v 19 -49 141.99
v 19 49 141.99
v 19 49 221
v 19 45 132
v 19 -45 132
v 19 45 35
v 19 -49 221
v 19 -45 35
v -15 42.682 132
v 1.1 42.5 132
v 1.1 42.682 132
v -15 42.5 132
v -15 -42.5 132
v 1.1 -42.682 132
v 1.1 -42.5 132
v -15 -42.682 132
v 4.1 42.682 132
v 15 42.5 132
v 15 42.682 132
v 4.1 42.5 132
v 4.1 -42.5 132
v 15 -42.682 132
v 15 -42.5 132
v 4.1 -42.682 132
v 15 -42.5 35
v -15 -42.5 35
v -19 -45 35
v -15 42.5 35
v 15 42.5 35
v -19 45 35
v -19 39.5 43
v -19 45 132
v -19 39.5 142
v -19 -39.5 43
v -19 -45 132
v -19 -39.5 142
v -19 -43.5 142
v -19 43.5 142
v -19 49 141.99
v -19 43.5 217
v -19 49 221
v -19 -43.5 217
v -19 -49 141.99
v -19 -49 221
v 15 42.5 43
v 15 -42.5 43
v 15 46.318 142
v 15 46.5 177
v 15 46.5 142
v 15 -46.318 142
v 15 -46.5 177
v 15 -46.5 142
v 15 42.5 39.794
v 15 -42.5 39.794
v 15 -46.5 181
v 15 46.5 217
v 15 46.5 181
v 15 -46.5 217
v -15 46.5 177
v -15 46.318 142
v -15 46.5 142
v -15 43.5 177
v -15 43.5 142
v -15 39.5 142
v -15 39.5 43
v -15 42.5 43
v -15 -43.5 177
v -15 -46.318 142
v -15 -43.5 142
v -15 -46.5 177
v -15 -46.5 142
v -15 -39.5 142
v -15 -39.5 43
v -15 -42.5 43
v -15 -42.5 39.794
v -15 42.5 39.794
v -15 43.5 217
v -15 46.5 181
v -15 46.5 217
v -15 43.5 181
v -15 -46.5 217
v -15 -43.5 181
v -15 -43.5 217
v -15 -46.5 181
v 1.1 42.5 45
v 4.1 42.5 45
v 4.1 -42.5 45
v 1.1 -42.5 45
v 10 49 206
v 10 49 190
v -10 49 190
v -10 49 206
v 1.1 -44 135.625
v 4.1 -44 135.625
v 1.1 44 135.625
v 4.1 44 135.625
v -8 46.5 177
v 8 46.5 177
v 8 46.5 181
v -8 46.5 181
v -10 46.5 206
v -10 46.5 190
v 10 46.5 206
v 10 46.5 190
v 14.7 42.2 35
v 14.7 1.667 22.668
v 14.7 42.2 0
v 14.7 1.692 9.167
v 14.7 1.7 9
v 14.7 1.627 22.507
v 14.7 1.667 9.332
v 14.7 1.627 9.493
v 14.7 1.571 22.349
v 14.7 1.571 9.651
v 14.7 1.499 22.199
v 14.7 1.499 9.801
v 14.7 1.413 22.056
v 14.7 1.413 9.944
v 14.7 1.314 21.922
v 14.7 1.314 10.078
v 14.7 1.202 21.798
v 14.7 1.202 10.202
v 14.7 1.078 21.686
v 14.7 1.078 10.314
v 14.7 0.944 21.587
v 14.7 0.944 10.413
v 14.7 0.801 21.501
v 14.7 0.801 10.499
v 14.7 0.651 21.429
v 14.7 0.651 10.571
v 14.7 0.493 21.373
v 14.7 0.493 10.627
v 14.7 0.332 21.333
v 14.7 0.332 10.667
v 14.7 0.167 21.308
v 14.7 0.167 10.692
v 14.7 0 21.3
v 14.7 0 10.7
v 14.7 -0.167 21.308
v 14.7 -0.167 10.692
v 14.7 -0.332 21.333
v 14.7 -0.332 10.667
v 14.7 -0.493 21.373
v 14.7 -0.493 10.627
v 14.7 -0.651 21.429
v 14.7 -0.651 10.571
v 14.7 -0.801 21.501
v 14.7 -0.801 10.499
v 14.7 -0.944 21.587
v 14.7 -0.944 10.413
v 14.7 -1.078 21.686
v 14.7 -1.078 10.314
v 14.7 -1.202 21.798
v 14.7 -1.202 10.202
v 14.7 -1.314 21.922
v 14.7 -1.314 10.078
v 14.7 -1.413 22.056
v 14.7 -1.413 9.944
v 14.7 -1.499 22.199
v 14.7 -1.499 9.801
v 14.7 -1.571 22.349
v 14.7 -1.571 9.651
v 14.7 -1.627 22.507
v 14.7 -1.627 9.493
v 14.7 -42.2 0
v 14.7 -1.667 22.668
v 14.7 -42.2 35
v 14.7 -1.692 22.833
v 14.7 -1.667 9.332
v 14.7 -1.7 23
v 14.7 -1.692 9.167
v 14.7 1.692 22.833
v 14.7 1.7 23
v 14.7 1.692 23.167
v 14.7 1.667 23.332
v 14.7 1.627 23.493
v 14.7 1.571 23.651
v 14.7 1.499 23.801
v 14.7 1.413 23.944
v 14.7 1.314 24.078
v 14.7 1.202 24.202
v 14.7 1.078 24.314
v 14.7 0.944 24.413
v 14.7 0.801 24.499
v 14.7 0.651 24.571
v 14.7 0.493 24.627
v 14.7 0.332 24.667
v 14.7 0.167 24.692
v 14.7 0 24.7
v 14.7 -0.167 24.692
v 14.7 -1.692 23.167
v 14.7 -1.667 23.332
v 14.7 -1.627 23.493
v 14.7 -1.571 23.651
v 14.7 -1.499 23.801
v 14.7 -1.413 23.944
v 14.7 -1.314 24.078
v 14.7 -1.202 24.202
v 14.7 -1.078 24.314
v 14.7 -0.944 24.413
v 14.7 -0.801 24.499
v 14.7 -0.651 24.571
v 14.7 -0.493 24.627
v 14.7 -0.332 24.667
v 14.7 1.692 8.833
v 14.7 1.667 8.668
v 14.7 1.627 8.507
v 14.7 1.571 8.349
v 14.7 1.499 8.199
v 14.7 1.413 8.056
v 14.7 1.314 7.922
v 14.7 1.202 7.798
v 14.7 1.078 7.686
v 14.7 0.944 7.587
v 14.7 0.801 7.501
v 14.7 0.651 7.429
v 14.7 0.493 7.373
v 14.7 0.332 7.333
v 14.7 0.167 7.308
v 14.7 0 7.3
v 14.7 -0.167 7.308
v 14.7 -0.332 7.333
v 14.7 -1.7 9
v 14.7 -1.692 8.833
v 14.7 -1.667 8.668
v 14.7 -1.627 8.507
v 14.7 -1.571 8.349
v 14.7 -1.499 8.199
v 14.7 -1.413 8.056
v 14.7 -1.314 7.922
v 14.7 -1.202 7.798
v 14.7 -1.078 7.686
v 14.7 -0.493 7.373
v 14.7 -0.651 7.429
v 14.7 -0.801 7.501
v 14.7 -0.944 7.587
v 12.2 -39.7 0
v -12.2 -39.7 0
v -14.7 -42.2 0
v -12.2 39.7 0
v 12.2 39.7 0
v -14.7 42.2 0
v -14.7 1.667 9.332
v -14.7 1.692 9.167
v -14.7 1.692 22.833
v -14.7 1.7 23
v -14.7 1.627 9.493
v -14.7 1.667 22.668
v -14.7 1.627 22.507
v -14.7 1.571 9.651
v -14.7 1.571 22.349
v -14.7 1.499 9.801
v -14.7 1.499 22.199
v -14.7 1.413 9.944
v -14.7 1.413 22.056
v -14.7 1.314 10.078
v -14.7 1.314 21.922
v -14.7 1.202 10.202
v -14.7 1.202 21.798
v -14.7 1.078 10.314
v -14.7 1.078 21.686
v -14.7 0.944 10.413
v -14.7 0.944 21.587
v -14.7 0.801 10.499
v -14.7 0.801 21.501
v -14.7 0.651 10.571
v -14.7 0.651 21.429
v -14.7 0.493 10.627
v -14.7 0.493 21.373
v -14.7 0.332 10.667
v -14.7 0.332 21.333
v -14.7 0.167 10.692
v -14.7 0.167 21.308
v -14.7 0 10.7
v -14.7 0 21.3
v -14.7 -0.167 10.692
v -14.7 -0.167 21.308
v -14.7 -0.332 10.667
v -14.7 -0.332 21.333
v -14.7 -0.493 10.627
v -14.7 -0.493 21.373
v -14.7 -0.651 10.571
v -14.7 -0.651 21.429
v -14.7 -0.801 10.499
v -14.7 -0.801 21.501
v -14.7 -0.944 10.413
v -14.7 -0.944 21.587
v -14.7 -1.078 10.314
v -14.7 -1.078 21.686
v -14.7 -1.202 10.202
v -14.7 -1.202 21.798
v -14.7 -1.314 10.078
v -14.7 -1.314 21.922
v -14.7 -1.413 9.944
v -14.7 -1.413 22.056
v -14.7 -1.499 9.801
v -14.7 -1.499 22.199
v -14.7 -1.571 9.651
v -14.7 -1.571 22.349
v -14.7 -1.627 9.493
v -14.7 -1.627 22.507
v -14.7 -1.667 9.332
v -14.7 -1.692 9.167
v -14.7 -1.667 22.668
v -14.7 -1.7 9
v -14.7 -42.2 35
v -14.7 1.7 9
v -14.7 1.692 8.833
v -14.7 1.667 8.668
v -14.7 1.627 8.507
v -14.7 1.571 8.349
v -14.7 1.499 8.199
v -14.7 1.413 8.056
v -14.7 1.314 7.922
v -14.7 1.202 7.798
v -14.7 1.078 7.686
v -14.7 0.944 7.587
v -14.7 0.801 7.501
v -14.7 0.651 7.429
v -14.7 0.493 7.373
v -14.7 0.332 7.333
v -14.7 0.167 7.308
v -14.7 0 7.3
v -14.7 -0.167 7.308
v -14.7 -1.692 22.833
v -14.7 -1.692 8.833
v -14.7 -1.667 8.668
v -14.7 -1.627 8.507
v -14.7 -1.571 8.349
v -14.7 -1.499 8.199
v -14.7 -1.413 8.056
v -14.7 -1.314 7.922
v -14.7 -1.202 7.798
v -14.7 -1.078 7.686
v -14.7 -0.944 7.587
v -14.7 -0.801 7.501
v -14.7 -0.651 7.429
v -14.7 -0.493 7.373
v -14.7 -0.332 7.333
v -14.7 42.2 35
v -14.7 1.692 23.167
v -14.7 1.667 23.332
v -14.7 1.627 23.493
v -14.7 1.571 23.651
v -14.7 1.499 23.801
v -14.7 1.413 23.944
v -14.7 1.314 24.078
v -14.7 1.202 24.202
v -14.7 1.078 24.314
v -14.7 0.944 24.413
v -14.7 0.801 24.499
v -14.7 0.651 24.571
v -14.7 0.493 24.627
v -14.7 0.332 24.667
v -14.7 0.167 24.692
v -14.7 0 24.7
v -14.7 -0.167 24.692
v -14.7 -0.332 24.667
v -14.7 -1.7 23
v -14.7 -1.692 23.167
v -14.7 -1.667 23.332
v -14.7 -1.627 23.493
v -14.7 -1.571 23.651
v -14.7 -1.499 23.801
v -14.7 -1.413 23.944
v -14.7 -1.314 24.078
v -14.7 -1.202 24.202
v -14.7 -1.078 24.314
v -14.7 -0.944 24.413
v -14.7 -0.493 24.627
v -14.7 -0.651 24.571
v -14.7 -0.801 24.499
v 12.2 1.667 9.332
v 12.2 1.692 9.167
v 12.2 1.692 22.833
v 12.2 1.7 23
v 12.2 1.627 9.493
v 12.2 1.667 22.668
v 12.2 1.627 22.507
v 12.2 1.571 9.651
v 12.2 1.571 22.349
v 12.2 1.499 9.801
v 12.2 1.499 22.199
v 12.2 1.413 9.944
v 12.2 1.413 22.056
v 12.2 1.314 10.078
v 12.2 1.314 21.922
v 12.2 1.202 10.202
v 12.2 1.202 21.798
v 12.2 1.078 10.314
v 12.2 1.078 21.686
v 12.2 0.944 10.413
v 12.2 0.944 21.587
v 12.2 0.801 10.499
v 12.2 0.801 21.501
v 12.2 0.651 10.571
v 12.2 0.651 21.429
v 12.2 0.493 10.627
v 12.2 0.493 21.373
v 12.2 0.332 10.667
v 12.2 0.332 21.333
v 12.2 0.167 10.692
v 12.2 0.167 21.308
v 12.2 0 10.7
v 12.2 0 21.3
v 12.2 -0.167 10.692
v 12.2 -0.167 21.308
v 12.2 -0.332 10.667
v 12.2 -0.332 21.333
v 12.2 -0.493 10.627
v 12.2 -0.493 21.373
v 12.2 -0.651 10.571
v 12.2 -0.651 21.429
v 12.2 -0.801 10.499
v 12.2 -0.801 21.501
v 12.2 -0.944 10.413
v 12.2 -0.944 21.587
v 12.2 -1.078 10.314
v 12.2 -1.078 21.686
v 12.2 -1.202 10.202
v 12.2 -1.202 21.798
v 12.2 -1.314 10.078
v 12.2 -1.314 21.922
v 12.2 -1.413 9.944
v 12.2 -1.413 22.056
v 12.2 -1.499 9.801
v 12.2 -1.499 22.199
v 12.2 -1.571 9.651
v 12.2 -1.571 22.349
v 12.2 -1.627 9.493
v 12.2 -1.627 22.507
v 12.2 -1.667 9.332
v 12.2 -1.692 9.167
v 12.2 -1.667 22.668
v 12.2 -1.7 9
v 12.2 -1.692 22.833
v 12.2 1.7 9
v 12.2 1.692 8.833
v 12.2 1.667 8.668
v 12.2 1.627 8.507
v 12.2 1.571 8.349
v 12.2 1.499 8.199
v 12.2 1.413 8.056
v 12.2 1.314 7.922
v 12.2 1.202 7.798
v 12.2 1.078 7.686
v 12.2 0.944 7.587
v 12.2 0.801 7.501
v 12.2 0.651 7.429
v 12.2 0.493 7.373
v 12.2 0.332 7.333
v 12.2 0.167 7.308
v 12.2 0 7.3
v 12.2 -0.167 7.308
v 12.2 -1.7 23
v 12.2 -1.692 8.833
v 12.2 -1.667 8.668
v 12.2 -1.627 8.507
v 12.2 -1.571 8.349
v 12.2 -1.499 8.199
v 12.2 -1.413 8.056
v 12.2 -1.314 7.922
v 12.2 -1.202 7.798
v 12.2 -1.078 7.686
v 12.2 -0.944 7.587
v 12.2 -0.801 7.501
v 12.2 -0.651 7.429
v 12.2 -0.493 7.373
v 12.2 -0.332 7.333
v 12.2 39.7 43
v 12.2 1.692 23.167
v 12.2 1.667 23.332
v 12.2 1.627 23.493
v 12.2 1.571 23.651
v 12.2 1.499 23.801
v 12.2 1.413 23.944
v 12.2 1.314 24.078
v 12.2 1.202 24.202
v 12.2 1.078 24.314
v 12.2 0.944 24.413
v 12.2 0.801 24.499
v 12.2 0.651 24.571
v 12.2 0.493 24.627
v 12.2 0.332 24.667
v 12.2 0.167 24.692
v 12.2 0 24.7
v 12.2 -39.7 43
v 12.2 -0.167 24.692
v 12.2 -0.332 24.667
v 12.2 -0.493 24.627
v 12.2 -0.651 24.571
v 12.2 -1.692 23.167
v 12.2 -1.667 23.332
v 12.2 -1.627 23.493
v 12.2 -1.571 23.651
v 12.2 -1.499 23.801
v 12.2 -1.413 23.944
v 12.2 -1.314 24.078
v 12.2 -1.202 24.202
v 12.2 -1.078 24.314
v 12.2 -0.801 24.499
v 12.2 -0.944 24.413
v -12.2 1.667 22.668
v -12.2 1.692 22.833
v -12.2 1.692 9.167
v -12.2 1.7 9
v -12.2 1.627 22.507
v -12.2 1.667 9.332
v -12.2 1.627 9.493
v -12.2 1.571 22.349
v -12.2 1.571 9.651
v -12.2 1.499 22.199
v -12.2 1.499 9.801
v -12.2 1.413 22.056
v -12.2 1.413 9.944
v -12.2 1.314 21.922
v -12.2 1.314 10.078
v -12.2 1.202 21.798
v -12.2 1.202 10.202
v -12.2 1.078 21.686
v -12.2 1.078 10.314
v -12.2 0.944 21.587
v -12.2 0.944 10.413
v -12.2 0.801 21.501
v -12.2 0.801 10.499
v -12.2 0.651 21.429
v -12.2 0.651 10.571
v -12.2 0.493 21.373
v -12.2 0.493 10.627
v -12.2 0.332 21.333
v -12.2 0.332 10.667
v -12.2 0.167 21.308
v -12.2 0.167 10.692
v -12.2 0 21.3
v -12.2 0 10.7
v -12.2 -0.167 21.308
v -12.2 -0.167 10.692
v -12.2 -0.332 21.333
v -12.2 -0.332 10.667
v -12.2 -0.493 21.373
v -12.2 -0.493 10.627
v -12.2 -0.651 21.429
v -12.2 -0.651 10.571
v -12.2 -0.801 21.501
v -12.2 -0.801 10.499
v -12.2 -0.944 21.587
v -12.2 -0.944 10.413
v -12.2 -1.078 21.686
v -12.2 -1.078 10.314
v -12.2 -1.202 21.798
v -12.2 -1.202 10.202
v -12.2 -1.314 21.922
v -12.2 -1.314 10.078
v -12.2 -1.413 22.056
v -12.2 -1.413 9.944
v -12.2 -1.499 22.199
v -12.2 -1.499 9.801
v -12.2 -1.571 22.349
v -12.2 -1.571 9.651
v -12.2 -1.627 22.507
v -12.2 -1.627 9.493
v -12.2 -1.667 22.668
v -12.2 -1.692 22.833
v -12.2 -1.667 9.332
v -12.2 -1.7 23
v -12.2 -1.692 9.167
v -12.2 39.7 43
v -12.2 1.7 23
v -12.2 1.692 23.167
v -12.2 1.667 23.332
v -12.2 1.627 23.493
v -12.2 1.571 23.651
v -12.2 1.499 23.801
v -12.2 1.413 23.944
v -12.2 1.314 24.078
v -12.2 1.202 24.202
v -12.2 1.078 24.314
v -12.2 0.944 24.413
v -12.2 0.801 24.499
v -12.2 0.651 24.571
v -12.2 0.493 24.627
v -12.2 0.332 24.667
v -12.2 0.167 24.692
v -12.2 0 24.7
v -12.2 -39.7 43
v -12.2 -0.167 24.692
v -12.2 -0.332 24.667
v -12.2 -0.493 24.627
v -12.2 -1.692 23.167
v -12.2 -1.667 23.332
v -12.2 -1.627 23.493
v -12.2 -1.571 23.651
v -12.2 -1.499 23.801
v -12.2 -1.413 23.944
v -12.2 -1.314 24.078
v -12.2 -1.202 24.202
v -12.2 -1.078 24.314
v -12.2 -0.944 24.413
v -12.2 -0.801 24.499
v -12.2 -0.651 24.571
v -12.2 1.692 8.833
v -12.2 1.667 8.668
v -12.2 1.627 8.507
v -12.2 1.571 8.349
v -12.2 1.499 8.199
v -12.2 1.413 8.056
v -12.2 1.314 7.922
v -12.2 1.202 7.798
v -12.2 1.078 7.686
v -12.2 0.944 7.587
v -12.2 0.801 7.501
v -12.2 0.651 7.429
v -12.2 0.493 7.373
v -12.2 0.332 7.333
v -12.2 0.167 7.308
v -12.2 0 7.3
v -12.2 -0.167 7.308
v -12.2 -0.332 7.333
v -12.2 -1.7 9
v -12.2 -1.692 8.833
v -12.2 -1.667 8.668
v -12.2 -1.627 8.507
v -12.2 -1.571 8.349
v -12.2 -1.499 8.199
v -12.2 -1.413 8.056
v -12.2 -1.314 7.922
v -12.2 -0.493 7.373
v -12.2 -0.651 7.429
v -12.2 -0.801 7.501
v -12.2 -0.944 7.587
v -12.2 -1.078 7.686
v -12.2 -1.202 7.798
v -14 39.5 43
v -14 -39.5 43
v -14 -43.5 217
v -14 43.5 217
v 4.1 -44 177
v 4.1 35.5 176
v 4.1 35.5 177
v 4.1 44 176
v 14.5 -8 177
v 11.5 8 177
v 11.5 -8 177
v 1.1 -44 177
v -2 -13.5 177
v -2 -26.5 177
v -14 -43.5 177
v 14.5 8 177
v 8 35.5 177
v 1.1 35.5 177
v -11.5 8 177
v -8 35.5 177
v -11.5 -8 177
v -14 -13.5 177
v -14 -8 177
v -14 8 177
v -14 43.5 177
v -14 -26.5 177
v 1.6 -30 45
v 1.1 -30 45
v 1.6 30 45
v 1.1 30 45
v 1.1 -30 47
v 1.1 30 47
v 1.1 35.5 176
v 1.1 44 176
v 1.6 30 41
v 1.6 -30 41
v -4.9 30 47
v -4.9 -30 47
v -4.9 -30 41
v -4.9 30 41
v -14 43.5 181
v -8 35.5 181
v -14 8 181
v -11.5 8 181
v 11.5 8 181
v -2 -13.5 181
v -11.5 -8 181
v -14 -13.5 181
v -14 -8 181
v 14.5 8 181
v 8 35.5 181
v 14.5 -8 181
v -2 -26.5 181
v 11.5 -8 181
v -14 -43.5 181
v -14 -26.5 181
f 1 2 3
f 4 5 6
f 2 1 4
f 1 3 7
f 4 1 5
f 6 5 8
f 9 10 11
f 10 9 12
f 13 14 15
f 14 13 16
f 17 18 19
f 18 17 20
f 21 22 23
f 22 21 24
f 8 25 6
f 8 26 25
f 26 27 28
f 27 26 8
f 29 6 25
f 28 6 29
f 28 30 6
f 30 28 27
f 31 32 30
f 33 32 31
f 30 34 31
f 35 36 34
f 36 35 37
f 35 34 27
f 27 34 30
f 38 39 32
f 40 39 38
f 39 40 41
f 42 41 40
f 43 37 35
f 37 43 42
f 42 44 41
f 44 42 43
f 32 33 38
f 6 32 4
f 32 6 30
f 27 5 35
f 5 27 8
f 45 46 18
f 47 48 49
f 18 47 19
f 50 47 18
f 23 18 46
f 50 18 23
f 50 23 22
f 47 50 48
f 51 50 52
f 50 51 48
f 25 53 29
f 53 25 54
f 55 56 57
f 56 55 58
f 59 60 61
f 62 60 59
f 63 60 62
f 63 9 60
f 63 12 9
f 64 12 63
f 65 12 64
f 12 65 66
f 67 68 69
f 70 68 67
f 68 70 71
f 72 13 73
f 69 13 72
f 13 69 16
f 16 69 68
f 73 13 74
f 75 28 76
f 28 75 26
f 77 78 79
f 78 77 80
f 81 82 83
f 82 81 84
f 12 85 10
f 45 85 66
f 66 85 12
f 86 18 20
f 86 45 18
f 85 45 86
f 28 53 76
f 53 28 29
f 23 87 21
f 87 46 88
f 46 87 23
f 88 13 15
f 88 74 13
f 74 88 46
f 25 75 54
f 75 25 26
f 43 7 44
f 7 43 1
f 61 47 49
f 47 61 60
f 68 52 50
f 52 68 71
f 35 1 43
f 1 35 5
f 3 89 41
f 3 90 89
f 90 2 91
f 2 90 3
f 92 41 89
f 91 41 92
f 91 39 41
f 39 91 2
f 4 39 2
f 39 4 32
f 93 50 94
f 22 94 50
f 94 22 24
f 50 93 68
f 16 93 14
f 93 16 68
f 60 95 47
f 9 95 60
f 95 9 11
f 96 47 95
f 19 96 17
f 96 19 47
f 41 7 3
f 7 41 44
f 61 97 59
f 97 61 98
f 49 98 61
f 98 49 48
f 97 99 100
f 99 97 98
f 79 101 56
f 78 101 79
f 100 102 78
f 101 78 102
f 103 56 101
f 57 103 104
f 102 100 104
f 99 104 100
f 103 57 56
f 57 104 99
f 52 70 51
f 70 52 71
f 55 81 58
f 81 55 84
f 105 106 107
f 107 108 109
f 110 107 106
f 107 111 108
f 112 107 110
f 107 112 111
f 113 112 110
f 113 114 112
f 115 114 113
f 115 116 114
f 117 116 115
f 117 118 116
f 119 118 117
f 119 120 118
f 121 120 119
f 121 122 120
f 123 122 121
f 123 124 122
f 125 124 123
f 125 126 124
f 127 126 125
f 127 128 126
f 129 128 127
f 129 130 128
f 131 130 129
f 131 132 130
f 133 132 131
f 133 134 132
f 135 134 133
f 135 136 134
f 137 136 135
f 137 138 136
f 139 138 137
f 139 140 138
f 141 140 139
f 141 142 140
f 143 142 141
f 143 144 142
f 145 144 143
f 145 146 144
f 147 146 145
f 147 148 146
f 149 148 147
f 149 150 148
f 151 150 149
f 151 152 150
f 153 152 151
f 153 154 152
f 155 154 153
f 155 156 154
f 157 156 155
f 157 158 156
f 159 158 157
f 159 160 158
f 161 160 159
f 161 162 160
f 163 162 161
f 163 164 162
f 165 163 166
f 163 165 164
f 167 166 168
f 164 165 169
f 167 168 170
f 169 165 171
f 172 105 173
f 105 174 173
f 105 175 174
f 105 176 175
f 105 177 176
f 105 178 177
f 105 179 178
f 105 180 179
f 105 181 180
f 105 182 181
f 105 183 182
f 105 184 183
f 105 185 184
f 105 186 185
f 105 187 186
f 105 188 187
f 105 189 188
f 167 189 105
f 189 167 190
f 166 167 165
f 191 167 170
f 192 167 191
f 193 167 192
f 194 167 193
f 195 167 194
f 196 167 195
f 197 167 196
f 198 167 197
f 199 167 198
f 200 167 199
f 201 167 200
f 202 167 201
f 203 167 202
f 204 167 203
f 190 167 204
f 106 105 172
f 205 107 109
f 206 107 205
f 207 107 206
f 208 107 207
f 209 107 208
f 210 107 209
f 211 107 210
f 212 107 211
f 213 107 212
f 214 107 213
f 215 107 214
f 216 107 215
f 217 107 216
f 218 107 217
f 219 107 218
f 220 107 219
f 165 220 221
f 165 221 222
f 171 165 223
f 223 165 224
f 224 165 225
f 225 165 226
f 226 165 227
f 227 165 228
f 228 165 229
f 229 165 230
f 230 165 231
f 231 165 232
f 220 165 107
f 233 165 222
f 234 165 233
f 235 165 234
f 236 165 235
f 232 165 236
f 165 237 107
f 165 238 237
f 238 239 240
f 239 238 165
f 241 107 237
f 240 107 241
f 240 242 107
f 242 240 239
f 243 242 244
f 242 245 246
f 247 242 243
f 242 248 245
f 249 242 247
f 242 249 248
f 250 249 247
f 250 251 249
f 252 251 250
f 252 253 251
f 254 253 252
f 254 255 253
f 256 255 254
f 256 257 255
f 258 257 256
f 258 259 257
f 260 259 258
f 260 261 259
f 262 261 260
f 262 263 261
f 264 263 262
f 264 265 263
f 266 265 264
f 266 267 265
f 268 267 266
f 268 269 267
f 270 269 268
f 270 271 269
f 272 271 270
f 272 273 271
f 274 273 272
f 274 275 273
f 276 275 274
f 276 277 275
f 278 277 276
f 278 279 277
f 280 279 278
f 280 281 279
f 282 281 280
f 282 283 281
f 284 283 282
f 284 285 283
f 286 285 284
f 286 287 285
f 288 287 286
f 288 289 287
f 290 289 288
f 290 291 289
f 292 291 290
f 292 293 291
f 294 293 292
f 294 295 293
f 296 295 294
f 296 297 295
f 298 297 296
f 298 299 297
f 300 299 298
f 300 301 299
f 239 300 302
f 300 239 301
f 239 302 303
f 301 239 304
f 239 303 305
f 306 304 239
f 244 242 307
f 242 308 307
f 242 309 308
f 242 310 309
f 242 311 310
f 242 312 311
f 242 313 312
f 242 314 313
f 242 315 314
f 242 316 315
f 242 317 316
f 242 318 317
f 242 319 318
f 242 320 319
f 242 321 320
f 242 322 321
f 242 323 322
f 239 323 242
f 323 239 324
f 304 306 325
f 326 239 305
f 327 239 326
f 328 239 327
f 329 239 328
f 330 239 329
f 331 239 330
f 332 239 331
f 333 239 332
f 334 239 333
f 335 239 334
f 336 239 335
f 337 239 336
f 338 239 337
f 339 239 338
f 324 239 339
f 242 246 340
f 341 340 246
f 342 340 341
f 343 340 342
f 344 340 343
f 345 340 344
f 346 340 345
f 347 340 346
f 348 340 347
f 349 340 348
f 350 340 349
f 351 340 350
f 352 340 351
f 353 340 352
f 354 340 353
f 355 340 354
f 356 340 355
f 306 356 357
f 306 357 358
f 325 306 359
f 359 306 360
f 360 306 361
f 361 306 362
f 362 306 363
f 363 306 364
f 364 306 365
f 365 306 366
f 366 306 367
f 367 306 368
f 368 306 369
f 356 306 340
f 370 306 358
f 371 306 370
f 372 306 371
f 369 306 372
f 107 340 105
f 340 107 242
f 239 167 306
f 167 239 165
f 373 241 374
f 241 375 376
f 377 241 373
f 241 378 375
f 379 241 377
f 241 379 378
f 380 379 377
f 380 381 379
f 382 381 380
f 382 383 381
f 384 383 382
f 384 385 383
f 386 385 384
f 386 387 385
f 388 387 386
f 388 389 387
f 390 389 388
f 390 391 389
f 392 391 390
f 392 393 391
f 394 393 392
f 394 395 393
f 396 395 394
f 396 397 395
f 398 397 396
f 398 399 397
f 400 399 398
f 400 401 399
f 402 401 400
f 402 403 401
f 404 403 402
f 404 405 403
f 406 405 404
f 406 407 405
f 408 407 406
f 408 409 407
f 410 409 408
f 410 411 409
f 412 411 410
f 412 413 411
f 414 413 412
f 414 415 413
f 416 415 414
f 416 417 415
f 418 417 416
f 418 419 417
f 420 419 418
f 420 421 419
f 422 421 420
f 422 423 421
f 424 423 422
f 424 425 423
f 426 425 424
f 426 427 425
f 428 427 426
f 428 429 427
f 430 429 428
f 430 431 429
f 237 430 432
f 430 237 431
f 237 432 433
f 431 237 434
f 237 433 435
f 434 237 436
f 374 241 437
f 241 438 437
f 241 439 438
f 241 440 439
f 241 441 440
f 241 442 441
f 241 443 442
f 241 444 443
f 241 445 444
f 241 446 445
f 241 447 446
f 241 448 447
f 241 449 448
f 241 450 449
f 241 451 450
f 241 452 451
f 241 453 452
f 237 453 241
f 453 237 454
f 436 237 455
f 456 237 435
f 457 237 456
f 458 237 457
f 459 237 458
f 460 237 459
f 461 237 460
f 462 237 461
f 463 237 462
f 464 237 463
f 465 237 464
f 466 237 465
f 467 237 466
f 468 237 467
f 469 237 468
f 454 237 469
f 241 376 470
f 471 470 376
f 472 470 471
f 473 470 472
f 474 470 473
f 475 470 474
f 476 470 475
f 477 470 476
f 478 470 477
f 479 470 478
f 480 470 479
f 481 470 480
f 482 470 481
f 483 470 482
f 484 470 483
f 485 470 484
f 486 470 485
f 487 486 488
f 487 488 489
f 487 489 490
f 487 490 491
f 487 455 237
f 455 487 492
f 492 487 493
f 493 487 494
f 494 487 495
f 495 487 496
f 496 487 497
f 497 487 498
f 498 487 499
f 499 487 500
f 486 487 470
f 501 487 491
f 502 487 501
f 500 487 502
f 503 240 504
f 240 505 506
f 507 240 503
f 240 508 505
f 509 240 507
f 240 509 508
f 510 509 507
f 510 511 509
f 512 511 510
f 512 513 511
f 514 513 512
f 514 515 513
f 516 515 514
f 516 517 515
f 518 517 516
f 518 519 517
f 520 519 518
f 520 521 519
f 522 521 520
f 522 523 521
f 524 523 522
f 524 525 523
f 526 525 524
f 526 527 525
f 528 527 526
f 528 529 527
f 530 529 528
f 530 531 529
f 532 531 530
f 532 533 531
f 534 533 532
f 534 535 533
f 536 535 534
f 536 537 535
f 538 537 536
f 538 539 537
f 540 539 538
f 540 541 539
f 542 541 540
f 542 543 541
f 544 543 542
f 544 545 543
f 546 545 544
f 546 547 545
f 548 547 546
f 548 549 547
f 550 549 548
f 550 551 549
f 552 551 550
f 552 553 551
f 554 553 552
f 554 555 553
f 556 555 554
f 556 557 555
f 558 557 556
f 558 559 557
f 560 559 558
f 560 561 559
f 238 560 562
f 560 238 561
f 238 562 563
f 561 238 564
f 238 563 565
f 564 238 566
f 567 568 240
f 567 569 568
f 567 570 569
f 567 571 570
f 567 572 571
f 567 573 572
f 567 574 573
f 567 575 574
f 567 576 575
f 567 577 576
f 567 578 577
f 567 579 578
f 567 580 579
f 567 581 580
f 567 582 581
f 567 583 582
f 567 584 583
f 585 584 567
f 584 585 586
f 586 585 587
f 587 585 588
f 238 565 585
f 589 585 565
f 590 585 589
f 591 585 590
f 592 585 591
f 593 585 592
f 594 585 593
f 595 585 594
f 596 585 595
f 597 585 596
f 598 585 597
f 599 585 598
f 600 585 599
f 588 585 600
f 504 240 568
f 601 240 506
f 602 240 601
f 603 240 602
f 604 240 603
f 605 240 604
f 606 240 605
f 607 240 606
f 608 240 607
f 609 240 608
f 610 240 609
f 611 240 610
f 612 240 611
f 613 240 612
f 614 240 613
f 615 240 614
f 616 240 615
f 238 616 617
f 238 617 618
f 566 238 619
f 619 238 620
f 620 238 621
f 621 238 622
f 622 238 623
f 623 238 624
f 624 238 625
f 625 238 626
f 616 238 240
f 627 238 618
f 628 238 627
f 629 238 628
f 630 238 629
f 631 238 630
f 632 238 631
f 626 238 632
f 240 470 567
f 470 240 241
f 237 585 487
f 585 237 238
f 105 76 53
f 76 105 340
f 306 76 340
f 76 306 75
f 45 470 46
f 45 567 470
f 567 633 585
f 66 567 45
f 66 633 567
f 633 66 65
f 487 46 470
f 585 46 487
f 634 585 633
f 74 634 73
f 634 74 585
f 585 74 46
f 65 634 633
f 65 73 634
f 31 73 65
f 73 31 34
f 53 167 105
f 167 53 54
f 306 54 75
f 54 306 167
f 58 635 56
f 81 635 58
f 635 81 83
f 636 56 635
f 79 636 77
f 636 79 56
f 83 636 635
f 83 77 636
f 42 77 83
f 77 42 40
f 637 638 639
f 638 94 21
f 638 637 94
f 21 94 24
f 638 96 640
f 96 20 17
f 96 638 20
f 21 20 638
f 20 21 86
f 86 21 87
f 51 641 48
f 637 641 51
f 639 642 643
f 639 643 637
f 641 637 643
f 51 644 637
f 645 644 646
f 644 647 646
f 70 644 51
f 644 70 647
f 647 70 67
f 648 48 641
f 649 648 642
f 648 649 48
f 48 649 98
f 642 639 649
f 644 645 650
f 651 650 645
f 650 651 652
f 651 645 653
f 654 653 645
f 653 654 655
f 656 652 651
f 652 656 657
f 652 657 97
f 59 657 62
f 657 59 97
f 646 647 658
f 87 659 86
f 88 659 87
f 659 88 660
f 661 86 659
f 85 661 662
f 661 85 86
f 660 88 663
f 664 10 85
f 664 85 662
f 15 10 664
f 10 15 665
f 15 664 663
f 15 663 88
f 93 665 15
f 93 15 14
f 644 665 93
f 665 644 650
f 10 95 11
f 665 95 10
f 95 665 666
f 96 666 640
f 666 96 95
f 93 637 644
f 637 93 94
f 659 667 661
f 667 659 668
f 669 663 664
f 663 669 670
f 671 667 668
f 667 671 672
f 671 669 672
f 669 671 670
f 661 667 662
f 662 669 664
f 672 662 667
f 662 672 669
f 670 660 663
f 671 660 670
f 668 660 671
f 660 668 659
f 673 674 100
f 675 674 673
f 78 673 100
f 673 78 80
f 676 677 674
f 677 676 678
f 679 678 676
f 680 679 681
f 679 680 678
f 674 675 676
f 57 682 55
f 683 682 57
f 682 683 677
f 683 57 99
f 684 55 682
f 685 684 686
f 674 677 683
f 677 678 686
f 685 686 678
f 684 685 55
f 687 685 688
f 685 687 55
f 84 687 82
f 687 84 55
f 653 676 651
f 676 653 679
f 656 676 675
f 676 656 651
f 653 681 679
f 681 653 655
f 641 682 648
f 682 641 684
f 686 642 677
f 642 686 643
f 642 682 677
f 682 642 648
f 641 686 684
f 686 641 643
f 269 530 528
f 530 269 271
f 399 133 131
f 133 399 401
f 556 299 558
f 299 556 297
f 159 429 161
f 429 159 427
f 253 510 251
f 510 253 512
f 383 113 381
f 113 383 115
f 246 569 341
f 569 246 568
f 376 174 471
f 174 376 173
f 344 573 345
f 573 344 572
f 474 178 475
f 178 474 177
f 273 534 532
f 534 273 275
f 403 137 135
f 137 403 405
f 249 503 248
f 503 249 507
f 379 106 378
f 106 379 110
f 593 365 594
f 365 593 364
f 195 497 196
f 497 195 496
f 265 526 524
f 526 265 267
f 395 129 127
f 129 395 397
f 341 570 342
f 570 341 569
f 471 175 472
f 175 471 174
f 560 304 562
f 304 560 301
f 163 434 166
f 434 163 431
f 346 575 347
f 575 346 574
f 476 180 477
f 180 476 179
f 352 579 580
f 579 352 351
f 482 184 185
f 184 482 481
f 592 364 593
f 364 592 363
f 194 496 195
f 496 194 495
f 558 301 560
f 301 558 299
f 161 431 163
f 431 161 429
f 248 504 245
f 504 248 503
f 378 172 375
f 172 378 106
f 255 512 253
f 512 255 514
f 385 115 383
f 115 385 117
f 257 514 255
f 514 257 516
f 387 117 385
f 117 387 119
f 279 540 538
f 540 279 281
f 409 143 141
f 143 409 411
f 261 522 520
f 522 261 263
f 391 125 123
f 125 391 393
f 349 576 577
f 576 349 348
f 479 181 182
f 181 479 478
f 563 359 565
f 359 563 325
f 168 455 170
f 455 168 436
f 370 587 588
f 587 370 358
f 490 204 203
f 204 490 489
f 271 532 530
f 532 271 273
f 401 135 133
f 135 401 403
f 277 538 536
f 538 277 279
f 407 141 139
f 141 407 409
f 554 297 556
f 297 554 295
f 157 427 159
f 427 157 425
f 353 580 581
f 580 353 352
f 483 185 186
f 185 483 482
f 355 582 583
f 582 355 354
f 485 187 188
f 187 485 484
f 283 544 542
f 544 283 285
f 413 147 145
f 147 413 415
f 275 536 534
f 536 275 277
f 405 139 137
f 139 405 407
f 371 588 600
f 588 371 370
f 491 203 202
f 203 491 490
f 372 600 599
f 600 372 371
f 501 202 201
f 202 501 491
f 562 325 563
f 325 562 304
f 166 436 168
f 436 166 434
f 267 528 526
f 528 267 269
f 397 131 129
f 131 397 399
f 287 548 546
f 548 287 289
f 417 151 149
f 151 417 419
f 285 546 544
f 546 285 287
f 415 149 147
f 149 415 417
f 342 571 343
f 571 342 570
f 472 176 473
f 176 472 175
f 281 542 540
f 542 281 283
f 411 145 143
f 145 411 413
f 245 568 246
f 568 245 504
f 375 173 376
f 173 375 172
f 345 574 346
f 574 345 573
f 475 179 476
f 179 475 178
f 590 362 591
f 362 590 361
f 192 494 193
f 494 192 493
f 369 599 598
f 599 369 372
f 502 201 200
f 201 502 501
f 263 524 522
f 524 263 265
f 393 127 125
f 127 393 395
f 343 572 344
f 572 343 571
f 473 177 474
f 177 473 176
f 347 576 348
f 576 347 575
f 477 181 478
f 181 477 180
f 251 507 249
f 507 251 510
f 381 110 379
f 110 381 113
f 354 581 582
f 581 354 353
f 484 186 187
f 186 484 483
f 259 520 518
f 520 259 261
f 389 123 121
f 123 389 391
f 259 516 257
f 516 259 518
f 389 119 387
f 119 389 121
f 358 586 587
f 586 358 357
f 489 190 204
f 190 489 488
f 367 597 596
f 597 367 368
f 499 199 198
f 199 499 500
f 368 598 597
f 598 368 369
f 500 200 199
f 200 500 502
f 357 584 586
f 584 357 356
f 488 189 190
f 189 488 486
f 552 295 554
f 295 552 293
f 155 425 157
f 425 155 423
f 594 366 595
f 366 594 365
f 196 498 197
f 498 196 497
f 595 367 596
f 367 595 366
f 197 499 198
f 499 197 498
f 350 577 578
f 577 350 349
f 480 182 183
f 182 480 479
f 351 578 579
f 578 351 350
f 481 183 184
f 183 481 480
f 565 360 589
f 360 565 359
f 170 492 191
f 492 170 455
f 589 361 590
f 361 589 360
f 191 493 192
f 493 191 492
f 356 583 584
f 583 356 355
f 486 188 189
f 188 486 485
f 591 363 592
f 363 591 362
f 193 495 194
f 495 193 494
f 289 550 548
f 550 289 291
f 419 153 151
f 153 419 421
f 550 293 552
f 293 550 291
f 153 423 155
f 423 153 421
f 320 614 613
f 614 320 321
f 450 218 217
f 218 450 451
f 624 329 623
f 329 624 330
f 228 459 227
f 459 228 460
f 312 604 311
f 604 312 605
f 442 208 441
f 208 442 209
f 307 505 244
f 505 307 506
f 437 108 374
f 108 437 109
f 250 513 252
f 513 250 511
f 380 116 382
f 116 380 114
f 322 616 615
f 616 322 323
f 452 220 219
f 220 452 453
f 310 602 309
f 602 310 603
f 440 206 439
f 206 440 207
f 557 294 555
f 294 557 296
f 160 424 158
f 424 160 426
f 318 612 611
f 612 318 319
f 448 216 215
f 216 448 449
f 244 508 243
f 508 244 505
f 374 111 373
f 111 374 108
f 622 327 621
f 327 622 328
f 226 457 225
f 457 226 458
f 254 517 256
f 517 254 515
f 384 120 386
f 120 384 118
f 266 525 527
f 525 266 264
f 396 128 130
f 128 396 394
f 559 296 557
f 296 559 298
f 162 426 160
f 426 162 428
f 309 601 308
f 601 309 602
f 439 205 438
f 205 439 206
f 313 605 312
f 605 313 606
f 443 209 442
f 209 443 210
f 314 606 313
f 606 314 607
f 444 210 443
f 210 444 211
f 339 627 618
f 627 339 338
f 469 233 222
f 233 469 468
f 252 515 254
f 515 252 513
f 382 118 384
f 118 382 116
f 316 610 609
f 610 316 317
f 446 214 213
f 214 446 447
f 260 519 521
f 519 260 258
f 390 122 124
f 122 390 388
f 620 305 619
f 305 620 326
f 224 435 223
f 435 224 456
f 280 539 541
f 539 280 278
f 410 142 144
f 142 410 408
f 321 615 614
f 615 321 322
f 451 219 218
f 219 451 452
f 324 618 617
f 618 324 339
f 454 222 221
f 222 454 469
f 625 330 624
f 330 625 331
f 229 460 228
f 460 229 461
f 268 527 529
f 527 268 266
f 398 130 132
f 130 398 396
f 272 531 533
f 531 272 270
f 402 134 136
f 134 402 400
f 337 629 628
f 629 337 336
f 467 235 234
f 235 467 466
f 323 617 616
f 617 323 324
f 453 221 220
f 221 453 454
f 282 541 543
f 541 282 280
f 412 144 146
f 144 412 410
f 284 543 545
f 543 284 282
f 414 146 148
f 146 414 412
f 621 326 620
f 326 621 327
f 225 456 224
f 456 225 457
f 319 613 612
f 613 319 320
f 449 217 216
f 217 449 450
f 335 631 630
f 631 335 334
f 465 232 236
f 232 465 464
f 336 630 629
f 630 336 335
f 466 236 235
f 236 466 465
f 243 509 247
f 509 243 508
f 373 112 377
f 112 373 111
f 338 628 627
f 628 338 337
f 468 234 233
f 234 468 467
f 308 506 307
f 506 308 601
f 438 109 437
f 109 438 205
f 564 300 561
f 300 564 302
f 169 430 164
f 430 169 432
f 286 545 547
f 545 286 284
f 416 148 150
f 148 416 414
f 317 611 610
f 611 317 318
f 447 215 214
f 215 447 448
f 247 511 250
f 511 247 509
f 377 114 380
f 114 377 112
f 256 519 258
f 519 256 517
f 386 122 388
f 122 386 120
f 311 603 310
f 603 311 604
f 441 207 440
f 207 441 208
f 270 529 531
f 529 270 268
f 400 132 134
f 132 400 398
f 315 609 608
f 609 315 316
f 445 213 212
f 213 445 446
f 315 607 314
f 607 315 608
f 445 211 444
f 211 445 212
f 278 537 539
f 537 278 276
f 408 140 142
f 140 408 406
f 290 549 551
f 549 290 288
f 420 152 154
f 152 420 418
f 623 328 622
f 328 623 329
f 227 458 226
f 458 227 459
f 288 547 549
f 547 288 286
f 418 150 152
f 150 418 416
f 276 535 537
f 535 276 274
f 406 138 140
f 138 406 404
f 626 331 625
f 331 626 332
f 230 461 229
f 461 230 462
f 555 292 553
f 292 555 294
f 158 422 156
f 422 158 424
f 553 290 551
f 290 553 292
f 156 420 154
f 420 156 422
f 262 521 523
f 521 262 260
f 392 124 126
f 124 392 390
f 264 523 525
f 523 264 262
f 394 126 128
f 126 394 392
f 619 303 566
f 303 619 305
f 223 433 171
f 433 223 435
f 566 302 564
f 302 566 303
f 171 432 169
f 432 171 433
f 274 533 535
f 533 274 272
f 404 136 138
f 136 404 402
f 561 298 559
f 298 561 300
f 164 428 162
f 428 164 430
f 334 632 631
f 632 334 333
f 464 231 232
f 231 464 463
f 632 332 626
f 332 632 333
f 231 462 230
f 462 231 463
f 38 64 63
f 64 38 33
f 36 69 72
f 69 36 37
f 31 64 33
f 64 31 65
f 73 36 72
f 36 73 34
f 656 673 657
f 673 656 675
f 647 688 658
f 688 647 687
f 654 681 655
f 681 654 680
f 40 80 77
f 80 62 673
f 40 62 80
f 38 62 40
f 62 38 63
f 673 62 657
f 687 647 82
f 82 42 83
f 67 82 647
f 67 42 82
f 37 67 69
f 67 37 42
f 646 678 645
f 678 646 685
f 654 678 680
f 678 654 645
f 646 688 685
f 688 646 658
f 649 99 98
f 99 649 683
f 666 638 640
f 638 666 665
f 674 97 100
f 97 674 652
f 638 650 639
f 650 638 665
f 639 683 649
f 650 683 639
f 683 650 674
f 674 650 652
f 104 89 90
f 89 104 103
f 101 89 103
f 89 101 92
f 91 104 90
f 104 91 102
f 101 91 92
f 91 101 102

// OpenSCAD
// Standalone robot upper body B piece (upper_bodyB v5.2) - A/B-final
// equipment bay, DOOR RETIRED. Changes vs v5.1 (2026-07-24):
//   - +22 mm TALLER (robot_l2 350 -> 372): the battery shelf / head is
//     raised so the shelf no longer covers the OpenCR top edge - 25 mm
//     of open cable room over the board top (was 3). The board itself
//     does not move (ELL_IMU unchanged).
//   - OPEN X- FACE with return lips replaces the screwed service door
//     (opening 79 wide vs the 75 board; battery bay opening 87).
//   - OpenCR = TAPE PAD + BOTTOM LEDGE (snap rivets retired): the
//     bulkhead front face is the board back plane, the board rests on a
//     ledge and is taped to the pad.
//   - CLOSED TELESCOPING SLEEVE splice into part A (replaces the two
//     X-side tongues that broke), flare-welded above the split, same
//     two cross bolts.
//   - POWER TOGGLE clicks into a front-open slot in the shelf front
//     edge ((*) measure the real switch: tsl_w / tsl_back_x / tsl_y).
// Print UPRIGHT as placed, sleeve down (~221 tall - fits X1C 256 with
// margin); the battery shelf bridges ~30 mm across X - allow bridging
// or a little support through the open face.
// Edit shared dimensions in frame_master.scad so the assembly stays linked.

part_mode = "upper_body_b";
part_cutaway = false;     // true removes a corner quarter: bulkhead, tape
                          // pad, seating ledge and battery shelf visible.
                          // Set back to false before exporting the STL!
print_export = true;      // use high quality $fn for STL export

include <frame_master.scad>
